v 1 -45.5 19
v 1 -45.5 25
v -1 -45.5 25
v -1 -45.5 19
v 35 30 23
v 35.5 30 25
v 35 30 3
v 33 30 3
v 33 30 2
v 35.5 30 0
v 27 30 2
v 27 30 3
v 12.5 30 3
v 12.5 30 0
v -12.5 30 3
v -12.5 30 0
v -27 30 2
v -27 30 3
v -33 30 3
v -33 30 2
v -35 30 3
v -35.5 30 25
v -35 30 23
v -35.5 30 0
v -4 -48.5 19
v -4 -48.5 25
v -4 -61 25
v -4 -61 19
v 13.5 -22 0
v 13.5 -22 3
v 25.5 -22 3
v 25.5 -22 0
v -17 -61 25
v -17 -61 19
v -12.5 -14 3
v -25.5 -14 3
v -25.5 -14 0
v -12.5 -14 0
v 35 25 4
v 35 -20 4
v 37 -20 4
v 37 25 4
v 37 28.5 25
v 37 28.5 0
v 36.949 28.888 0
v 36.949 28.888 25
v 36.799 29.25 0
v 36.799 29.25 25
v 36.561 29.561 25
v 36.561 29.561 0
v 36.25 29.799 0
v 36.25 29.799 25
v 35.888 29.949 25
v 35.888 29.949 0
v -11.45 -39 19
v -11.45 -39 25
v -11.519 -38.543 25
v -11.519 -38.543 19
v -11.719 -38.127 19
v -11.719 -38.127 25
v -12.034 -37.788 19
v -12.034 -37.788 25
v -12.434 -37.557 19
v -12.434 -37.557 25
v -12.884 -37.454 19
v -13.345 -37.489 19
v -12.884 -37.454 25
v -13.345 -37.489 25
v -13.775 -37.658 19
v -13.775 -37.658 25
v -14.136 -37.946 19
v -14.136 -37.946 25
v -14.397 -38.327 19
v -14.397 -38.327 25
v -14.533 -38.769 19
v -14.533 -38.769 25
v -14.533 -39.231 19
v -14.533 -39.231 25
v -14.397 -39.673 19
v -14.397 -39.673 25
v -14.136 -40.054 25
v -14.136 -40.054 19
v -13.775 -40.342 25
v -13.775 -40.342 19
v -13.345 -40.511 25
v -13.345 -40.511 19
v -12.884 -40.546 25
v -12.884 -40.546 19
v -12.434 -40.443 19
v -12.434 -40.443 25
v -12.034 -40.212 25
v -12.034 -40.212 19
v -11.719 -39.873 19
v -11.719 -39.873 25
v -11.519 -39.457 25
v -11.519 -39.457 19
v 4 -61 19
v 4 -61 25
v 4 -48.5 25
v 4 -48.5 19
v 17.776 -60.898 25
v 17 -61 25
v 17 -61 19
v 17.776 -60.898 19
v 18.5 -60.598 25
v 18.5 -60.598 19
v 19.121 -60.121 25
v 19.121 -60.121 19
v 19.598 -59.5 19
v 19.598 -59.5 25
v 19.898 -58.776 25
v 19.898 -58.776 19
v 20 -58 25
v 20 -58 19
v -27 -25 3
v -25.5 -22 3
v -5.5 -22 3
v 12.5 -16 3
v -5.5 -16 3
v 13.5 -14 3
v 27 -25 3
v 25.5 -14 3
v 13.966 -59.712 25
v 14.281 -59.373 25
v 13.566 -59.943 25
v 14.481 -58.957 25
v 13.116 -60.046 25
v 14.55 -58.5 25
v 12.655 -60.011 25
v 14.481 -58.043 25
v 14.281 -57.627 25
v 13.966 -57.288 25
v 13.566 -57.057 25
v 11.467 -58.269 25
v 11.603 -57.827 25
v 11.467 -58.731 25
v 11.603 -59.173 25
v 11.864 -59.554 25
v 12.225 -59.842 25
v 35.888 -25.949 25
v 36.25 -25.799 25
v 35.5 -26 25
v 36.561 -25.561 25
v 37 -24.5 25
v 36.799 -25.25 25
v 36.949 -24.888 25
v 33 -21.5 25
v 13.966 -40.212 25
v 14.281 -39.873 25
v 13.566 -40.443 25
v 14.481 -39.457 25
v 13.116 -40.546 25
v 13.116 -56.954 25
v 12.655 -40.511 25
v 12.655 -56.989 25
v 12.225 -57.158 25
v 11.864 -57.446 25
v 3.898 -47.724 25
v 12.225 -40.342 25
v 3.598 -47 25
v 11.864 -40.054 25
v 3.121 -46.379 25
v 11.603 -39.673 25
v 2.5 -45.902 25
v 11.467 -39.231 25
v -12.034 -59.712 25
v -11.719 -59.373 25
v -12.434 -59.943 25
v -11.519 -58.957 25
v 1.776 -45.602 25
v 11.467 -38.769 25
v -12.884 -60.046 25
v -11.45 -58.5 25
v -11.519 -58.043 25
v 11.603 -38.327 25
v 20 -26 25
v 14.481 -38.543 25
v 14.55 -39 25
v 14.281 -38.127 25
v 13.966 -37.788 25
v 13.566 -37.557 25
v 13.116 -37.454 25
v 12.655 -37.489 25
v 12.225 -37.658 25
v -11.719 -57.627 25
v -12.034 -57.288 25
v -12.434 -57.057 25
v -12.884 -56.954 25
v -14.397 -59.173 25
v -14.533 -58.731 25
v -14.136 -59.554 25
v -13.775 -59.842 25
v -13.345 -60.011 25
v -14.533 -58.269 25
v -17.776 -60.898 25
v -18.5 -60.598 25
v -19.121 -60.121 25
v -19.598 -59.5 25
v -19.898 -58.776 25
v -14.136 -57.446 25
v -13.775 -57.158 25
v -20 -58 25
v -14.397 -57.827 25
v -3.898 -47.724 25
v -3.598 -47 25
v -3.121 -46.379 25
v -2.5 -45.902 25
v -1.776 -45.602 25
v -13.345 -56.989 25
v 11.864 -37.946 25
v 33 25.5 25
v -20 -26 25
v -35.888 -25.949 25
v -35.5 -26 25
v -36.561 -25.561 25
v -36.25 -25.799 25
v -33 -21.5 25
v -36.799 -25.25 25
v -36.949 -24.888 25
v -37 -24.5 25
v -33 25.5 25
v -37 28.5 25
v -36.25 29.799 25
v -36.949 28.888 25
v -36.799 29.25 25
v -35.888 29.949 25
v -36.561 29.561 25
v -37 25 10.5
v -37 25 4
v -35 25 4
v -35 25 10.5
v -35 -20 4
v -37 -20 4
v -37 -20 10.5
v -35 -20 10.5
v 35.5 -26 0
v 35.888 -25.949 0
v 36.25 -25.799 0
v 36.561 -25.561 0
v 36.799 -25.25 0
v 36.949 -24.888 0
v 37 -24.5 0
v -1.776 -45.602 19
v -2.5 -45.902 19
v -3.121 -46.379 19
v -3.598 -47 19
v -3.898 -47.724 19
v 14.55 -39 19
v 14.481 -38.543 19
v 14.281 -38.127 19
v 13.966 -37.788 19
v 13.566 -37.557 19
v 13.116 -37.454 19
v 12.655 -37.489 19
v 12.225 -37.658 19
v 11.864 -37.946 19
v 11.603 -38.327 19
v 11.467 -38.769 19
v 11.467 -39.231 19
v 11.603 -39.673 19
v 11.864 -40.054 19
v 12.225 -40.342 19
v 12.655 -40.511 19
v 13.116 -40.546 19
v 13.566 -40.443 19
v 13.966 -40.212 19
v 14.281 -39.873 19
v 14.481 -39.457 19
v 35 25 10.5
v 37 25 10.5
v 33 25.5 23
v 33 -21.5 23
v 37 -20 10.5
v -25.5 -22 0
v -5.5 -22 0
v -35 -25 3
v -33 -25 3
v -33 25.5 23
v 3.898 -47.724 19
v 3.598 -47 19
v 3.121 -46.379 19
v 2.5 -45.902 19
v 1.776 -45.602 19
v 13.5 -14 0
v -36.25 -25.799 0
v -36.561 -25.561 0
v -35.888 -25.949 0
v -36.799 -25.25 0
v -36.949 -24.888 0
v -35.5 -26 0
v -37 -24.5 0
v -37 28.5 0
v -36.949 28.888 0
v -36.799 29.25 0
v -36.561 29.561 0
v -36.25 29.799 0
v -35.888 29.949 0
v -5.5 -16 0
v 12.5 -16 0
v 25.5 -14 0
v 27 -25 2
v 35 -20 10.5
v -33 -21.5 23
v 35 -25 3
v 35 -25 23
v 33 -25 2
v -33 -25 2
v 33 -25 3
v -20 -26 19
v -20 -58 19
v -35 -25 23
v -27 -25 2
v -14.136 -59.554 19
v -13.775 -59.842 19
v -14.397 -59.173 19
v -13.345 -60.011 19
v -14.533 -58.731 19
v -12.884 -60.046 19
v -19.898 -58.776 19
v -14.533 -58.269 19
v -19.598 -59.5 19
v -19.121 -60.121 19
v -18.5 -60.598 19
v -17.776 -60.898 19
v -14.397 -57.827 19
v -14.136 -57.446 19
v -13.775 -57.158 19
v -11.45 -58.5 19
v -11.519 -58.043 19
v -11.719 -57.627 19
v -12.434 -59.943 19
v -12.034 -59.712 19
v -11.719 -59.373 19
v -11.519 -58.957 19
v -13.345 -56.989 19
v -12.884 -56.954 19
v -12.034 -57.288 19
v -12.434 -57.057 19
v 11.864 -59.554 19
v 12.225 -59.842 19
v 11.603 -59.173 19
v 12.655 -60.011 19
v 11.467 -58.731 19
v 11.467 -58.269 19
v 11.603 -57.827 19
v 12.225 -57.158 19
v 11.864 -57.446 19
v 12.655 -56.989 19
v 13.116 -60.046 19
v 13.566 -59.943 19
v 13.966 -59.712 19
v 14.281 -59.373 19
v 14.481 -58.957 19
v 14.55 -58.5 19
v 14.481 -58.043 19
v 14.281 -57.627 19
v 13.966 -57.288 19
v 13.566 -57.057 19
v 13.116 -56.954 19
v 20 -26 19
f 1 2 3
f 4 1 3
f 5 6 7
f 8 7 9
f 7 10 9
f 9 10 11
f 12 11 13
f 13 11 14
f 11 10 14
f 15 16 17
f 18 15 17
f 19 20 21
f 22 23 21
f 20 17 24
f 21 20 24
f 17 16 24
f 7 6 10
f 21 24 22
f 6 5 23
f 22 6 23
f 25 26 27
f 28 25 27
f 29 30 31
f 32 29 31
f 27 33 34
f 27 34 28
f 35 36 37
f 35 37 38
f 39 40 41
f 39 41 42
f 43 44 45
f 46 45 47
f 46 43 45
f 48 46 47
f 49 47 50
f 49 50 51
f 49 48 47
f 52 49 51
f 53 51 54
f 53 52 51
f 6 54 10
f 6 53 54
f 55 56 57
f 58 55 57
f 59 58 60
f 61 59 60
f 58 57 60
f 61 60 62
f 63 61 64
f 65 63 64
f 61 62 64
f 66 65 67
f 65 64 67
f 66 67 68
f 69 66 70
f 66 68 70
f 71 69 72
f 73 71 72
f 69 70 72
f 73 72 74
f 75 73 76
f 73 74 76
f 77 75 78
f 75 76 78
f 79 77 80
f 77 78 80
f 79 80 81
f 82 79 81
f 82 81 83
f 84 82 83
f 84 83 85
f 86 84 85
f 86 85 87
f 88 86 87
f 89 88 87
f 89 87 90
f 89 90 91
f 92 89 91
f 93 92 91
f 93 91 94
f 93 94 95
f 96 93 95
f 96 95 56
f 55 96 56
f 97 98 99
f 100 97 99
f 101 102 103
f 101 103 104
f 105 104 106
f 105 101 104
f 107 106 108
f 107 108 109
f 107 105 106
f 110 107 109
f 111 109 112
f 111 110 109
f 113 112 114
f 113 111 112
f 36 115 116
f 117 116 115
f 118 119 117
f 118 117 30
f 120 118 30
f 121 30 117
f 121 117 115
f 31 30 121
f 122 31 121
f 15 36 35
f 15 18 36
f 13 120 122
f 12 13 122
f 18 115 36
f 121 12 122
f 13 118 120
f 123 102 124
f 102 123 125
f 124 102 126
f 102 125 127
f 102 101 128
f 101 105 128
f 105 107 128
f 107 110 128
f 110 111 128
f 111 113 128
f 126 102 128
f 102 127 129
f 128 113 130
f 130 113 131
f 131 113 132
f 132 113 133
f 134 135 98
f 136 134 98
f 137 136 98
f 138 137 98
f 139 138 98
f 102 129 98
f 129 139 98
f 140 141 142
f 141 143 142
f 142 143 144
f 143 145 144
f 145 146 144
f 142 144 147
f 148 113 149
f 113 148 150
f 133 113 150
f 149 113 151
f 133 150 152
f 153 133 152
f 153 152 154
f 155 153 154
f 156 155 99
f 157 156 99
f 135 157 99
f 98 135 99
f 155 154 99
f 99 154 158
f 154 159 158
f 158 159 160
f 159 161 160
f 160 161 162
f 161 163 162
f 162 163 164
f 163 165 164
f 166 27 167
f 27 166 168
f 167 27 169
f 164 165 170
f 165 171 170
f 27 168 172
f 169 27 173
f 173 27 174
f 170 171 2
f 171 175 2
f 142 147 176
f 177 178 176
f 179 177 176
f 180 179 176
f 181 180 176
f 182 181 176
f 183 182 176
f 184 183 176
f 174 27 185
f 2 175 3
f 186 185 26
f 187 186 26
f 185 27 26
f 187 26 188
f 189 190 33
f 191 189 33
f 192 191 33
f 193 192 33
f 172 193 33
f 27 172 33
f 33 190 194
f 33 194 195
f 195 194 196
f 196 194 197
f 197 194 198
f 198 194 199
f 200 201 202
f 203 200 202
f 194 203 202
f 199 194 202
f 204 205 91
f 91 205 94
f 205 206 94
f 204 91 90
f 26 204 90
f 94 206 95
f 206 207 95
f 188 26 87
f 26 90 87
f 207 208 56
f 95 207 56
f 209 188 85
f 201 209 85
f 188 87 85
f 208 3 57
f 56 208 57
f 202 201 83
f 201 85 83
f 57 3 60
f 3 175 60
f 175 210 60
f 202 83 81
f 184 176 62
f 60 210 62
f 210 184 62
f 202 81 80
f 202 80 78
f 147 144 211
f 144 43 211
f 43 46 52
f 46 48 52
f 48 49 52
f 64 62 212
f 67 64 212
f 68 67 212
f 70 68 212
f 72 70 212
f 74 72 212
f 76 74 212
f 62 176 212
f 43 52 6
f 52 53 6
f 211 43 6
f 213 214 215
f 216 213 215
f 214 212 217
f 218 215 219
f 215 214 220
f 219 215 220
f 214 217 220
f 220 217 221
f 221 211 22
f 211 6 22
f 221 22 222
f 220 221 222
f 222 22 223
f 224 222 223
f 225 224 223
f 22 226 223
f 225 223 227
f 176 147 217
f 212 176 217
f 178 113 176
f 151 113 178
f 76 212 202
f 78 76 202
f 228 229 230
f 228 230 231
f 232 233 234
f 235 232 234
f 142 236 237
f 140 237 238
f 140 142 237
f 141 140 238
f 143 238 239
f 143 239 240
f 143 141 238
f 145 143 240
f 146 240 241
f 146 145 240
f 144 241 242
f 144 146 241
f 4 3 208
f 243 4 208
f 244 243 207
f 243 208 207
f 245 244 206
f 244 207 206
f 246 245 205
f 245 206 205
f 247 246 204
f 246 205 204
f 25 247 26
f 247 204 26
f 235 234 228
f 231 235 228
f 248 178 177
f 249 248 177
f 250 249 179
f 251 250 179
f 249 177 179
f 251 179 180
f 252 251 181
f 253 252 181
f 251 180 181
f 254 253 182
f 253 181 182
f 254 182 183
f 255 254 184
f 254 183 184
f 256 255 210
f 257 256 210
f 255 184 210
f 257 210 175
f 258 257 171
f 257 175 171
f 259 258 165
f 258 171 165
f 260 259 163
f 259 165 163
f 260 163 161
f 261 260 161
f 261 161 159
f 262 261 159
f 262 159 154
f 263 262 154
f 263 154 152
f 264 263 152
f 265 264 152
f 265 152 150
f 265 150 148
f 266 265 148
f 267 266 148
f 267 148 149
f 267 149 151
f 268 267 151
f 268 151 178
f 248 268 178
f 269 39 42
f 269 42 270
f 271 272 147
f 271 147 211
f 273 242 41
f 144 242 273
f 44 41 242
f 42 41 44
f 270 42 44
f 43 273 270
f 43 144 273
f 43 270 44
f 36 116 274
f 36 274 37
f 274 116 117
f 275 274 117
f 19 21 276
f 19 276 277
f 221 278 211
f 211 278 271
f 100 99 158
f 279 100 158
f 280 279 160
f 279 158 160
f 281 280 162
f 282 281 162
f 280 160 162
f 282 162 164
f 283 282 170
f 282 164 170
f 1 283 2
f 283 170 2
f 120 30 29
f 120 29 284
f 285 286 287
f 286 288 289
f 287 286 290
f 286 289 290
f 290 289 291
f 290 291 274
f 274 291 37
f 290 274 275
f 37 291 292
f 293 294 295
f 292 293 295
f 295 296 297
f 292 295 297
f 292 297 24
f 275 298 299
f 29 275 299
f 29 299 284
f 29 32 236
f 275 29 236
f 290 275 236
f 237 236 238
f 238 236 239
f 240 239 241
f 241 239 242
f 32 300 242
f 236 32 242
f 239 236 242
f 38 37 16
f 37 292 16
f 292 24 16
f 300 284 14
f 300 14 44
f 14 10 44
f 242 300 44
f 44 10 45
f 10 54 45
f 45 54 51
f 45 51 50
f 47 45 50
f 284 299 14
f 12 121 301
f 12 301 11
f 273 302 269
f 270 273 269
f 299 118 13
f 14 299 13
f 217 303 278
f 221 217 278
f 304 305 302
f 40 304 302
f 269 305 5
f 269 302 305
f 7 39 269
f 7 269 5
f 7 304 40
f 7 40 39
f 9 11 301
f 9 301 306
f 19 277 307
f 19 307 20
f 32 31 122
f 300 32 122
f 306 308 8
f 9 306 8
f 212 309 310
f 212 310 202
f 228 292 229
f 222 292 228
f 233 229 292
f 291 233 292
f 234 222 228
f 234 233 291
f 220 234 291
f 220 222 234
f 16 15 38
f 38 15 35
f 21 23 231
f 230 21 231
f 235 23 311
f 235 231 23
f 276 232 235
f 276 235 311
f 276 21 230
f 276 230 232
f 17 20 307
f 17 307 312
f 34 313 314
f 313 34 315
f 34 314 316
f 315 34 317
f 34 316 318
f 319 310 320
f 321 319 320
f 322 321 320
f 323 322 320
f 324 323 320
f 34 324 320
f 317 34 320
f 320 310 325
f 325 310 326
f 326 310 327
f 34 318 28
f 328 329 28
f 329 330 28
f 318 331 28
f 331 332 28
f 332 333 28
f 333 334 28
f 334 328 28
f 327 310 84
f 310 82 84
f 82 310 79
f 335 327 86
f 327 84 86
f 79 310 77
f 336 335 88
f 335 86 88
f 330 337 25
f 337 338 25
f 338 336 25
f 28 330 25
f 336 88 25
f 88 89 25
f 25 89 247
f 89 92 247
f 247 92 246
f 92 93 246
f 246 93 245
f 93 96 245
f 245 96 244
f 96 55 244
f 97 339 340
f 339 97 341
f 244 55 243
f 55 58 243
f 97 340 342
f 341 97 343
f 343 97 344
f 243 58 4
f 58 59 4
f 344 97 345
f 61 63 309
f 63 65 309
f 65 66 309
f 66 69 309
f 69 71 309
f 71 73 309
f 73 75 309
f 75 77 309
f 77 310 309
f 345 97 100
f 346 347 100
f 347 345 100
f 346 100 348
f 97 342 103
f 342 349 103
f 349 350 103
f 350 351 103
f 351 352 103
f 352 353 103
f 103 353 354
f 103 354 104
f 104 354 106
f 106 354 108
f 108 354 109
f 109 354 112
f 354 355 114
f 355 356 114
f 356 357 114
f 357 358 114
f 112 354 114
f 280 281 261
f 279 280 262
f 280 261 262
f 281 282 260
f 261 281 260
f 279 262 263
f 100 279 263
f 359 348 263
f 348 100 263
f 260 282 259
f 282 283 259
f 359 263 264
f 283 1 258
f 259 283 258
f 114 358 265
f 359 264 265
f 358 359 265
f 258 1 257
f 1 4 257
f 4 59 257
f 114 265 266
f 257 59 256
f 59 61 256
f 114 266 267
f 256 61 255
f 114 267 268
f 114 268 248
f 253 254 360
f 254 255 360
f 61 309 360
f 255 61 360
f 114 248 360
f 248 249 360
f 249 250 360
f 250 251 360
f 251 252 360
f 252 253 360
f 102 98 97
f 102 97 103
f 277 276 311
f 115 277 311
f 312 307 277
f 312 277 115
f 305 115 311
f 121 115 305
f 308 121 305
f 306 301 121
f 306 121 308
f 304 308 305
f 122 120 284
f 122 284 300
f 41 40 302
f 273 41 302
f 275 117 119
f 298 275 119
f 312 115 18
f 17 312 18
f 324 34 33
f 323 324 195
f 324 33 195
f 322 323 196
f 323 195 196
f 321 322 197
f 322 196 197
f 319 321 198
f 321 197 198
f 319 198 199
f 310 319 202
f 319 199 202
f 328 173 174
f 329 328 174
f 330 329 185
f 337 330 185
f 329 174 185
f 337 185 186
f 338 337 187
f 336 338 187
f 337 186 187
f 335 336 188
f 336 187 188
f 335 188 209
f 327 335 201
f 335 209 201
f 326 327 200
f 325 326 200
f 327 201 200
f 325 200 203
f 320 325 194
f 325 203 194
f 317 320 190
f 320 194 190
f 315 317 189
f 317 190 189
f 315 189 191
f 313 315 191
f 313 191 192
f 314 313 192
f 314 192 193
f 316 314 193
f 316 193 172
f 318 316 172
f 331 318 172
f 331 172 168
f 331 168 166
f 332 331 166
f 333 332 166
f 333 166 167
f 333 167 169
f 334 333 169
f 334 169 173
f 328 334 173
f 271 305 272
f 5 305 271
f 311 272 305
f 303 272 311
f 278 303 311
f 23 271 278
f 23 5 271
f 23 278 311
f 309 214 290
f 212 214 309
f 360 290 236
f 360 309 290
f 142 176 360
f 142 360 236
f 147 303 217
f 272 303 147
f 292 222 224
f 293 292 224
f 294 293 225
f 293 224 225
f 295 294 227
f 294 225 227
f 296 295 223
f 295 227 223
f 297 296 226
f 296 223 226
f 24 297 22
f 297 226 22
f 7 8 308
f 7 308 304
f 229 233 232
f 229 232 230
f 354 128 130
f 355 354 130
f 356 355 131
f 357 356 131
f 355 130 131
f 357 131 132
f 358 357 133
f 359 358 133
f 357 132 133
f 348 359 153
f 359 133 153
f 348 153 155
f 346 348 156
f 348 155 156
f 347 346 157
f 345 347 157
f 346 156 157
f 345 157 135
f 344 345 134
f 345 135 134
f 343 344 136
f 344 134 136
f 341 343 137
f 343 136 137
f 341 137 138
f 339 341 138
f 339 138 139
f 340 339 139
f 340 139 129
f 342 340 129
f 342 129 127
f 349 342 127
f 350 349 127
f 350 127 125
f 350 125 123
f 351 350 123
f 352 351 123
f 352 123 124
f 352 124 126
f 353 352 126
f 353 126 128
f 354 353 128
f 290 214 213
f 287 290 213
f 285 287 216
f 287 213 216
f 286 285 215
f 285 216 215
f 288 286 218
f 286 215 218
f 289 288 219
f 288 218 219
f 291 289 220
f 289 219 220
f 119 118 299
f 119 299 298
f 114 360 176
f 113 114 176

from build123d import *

# Parameters (mm, degrees)
SKETCH_1_W          = 80
SKETCH_1_H          = 60
EXTRUDE_1_DEPTH     = 3
CUT_EXTRUDE_1_DEPTH = 3
EXTRUDE_2_DEPTH     = 20
SKETCH_4_W          = 6.5
SKETCH_4_H          = 45
CUT_EXTRUDE_2_DEPTH = 89.481636513
SKETCH_5_W          = 6
SKETCH_5_H          = 55
CUT_EXTRUDE_3_DEPTH = 1
SKETCH_7_W          = 20
SKETCH_7_H          = 8
SKETCH_7_W_2        = 12
CUT_EXTRUDE_4_DEPTH = 3
SKETCH_8_W          = 66
SKETCH_8_H          = 47
EXTRUDE_3_DEPTH     = 2
CUT_EXTRUDE_5_DEPTH = 56.901699437
CUT_EXTRUDE_6_DEPTH = 54.795910625
SKETCH_12_W         = 40
SKETCH_12_H         = 6
EXTRUDE_4_DEPTH     = 35
SKETCH_13_R         = 1.55
CUT_EXTRUDE_7_DEPTH = 76.59761901


with BuildPart() as part:
    # 草图1 → 凸台-拉伸1 (new body)
    with BuildSketch(Plane.XY):
        Rectangle(SKETCH_1_W, SKETCH_1_H)
    extrude(amount=EXTRUDE_1_DEPTH)

    # 草图2 → 切除-拉伸1 (cut)
    with BuildSketch(Plane.XY.offset(3)):
        Polygon((-12.5, -8.5), (-12.5, 8.5), (-12.5, 30), (12.5, 30), (12.5, 8.5), (12.5, -8.5), (12.5, -16), (-12.5, -16), align=None)
    extrude(amount=-CUT_EXTRUDE_1_DEPTH, mode=Mode.SUBTRACT)

    # 草图3 → 凸台-拉伸2 (add)
    with BuildSketch(Plane.XY.offset(3)):
        Polygon((-40, 30), (-35, 30), (-35, -25), (35, -25), (35, 30), (40, 30), (40, -30), (-40, -30), align=None)
    extrude(amount=EXTRUDE_2_DEPTH)

    # 草图4 → 切除-拉伸2 (cut, through all)
    with BuildSketch(Plane.ZY.offset(40)):
        with Locations((7.25, 2.5)):
            Rectangle(SKETCH_4_W, SKETCH_4_H)
    extrude(amount=-CUT_EXTRUDE_2_DEPTH, mode=Mode.SUBTRACT)

    # 草图5 → 切除-拉伸3 (cut)
    with BuildSketch(Plane.XY.offset(3)):
        with Locations((-30, 2.5)):
            Rectangle(SKETCH_5_W, SKETCH_5_H)
        with Locations((30, 2.5)):
            Rectangle(SKETCH_5_W, SKETCH_5_H)
    extrude(amount=-CUT_EXTRUDE_3_DEPTH, mode=Mode.SUBTRACT)

    # 草图7 → 切除-拉伸4 (cut)
    with BuildSketch(Plane.XY.offset(3)):
        with Locations((-15.5, -18)):
            Rectangle(SKETCH_7_W, SKETCH_7_H)
        with Locations((19.5, -18)):
            Rectangle(SKETCH_7_W_2, SKETCH_7_H)
    extrude(amount=-CUT_EXTRUDE_4_DEPTH, mode=Mode.SUBTRACT)

    # 草图8 → 凸台-拉伸3 (add)
    with BuildSketch(Plane.XY.offset(23)):
        Polygon((-40, 30), (-32, 30), (32, 30), (40, 30), (40, -30), (-40, -30), align=None)
        with Locations((0, 2)):
            Rectangle(SKETCH_8_W, SKETCH_8_H, mode=Mode.SUBTRACT)
    extrude(amount=EXTRUDE_3_DEPTH)

    # 草图9 → 切除-拉伸5 (cut, through all)
    with BuildSketch(Plane.XY.offset(25)):
        Polygon((-40, 30), (-37, 30), (-37, -26), (37, -26), (37, 30), (40, 30), (40, -30), (38, -30), (-38, -30), (-40, -30), align=None)
    extrude(amount=-CUT_EXTRUDE_5_DEPTH, mode=Mode.SUBTRACT)

    # 草图11 → 切除-拉伸6 (cut, through all)
    with BuildSketch(Plane.XY.offset(25)):
        with BuildLine():
            Line((-35.5, 30), (-37, 30))
            Line((-37, 30), (-37, 28.5))
            ThreePointArc((-37, 28.5), (-36.560660172, 29.560660172), (-35.5, 30))
        make_face()
        with BuildLine():
            Line((-37, -24.5), (-37, -26))
            Line((-37, -26), (-35.5, -26))
            ThreePointArc((-35.5, -26), (-36.560660172, -25.560660172), (-37, -24.5))
        make_face()
        with BuildLine():
            Line((37, -24.5), (37, -26))
            Line((37, -26), (35.5, -26))
            ThreePointArc((35.5, -26), (36.560660172, -25.560660172), (37, -24.5))
        make_face()
        with BuildLine():
            Line((35.5, 30), (37, 30))
            Line((37, 30), (37, 28.5))
            ThreePointArc((37, 28.5), (36.560660172, 29.560660172), (35.5, 30))
        make_face()
    extrude(amount=-CUT_EXTRUDE_6_DEPTH, mode=Mode.SUBTRACT)

    # 草图12 → 凸台-拉伸4 (add)
    with BuildSketch(Plane.XZ.offset(26)):
        with Locations((0, 22)):
            Rectangle(SKETCH_12_W, SKETCH_12_H)
    extrude(amount=EXTRUDE_4_DEPTH)

    # 草图13 → 切除-拉伸7 (cut, through all)
    with BuildSketch(Plane.XY.offset(25)):
        with Locations((-13, -39)):
            Circle(SKETCH_13_R)
        with Locations((13, -39)):
            Circle(SKETCH_13_R)
        with Locations((-13, -58.5)):
            Circle(SKETCH_13_R)
        with Locations((13, -58.5)):
            Circle(SKETCH_13_R)
        with BuildLine():
            Line((-4, -61), (4, -61))
            Line((4, -61), (4, -48.5))
            ThreePointArc((4, -48.5), (3.121320344, -46.378679656), (1, -45.5))
            Line((1, -45.5), (0, -45.5))
            Line((0, -45.5), (-1, -45.5))
            ThreePointArc((-1, -45.5), (-3.121320344, -46.378679656), (-4, -48.5))
            Line((-4, -48.5), (-4, -61))
        make_face()
        with BuildLine():
            Line((20, -58), (20, -61))
            Line((20, -61), (17, -61))
            ThreePointArc((17, -61), (19.121320344, -60.121320344), (20, -58))
        make_face()
        with BuildLine():
            Line((-20, -58), (-20, -61))
            Line((-20, -61), (-17, -61))
            ThreePointArc((-17, -61), (-19.121320344, -60.121320344), (-20, -58))
        make_face()
    extrude(amount=-CUT_EXTRUDE_7_DEPTH, mode=Mode.SUBTRACT)


solid = part.part
